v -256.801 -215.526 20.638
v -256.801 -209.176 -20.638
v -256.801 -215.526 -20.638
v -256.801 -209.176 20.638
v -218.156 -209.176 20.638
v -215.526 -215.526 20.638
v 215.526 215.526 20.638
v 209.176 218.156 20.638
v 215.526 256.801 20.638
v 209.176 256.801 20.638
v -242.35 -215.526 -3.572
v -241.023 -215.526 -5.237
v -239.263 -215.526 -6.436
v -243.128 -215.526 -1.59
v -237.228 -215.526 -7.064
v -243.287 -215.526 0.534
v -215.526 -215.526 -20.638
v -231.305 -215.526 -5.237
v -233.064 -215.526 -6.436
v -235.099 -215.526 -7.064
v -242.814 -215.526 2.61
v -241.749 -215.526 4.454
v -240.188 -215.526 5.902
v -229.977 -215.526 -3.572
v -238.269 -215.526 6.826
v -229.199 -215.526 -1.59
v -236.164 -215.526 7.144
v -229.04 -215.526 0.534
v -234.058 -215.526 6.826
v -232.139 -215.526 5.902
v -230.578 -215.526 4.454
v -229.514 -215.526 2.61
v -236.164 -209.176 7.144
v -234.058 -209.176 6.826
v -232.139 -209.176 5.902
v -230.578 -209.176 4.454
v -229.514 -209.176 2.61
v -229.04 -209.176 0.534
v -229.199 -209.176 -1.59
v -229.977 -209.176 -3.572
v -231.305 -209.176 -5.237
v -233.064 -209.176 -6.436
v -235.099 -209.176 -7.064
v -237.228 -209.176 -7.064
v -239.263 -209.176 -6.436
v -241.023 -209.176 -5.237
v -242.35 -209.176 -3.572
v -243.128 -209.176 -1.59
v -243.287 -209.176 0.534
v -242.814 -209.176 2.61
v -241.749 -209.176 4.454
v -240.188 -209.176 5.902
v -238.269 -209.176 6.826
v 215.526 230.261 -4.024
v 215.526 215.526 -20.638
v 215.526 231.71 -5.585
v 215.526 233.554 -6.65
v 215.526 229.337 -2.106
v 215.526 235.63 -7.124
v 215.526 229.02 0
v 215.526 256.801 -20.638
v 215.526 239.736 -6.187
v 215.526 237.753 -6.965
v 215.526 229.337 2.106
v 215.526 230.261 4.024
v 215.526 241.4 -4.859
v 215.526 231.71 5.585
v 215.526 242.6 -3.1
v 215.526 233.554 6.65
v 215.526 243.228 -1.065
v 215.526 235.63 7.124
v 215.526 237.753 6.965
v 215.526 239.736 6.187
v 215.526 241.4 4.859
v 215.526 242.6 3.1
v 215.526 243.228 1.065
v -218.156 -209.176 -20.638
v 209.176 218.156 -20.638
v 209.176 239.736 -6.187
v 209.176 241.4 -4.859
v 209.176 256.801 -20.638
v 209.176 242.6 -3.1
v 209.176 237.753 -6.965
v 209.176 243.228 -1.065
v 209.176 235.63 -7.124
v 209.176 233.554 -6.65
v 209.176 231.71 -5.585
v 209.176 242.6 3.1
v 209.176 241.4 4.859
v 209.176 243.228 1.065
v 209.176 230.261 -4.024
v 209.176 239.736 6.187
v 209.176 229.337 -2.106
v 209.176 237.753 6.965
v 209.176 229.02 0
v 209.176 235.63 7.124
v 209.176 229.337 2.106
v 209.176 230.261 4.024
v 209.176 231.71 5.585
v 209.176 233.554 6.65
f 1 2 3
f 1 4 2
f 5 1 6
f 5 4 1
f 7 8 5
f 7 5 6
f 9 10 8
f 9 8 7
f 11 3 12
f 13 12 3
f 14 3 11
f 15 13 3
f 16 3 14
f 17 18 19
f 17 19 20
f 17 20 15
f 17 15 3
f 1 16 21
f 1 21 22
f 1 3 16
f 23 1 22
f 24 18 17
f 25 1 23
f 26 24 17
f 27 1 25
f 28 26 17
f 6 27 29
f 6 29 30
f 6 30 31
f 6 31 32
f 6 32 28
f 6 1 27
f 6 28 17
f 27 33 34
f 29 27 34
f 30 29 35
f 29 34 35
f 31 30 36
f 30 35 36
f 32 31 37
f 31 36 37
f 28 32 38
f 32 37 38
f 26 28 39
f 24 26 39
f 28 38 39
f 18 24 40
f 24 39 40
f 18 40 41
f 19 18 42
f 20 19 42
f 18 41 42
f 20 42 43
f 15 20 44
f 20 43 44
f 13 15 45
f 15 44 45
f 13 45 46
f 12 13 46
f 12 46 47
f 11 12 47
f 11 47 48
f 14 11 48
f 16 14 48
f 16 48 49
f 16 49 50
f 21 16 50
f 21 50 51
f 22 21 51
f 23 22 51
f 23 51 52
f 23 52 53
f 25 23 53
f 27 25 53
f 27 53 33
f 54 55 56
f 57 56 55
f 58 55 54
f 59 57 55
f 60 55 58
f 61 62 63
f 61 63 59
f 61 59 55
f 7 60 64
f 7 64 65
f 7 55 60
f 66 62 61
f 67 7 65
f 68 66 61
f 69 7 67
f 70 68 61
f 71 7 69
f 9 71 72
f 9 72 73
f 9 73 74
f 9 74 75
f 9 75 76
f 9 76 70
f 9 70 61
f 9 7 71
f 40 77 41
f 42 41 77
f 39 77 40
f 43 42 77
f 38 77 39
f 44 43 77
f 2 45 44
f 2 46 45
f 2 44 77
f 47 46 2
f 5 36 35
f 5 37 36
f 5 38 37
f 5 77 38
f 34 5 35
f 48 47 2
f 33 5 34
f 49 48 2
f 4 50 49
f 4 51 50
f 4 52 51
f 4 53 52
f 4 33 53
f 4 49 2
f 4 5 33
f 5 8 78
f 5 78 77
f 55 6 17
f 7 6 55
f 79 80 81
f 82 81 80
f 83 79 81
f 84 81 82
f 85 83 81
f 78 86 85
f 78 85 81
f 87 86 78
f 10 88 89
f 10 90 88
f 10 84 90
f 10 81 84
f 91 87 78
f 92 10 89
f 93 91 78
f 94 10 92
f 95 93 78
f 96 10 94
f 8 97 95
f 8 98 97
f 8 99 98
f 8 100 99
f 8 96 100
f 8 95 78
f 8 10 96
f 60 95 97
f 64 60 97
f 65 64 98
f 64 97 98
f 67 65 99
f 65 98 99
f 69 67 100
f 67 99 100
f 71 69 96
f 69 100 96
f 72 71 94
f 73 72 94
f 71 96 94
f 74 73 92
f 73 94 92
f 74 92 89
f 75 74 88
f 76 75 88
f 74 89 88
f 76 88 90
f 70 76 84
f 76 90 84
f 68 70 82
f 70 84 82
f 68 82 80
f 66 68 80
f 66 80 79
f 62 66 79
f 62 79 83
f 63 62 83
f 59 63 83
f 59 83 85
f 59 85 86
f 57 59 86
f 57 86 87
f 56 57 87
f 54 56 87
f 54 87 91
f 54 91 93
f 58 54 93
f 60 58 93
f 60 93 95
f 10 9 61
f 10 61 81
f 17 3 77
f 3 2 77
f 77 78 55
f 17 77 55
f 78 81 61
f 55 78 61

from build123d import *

# Parameters (mm, degrees)
EXTRUDE_THIN1_DEPTH = 20.6375
SKETCH2_R           = 7.14375
CUT_EXTRUDE1_DEPTH  = 533.454292692
SKETCH3_R           = 7.14375
CUT_EXTRUDE2_DEPTH  = 533.454292692


with BuildPart() as part:
    # Sketch1 → Extrude-Thin1 (new, symmetric)
    with BuildSketch(Plane.XY):
        Polygon((-256.801146906, -215.526146906), (-215.526146906, -215.526146906), (215.526146906, 215.526146906), (215.526146906, 256.801146906), (209.176146906, 256.801146906), (209.176146906, 218.156403027), (-218.156403027, -209.176146906), (-256.801146906, -209.176146906), align=None)
    extrude(amount=EXTRUDE_THIN1_DEPTH, both=True)

    # Sketch2 → Cut-Extrude1 (cut, through all)
    with BuildSketch(Plane(origin=(0, -209.176146906, 0), x_dir=(1, 0, 0), z_dir=(0, 1, 0))):
        with Locations(Location((-236.163646906, 0, 0), (0, 0, 270))):
            Circle(SKETCH2_R)
    extrude(amount=-CUT_EXTRUDE1_DEPTH, mode=Mode.SUBTRACT)

    # Sketch3 → Cut-Extrude2 (cut, through all)
    with BuildSketch(Plane.ZY.offset(-209.176146906)):
        with Locations(Location((0, 236.163646906, 0), (0, 0, 270))):
            Circle(SKETCH3_R)
    extrude(amount=-CUT_EXTRUDE2_DEPTH, mode=Mode.SUBTRACT)


solid = part.part
